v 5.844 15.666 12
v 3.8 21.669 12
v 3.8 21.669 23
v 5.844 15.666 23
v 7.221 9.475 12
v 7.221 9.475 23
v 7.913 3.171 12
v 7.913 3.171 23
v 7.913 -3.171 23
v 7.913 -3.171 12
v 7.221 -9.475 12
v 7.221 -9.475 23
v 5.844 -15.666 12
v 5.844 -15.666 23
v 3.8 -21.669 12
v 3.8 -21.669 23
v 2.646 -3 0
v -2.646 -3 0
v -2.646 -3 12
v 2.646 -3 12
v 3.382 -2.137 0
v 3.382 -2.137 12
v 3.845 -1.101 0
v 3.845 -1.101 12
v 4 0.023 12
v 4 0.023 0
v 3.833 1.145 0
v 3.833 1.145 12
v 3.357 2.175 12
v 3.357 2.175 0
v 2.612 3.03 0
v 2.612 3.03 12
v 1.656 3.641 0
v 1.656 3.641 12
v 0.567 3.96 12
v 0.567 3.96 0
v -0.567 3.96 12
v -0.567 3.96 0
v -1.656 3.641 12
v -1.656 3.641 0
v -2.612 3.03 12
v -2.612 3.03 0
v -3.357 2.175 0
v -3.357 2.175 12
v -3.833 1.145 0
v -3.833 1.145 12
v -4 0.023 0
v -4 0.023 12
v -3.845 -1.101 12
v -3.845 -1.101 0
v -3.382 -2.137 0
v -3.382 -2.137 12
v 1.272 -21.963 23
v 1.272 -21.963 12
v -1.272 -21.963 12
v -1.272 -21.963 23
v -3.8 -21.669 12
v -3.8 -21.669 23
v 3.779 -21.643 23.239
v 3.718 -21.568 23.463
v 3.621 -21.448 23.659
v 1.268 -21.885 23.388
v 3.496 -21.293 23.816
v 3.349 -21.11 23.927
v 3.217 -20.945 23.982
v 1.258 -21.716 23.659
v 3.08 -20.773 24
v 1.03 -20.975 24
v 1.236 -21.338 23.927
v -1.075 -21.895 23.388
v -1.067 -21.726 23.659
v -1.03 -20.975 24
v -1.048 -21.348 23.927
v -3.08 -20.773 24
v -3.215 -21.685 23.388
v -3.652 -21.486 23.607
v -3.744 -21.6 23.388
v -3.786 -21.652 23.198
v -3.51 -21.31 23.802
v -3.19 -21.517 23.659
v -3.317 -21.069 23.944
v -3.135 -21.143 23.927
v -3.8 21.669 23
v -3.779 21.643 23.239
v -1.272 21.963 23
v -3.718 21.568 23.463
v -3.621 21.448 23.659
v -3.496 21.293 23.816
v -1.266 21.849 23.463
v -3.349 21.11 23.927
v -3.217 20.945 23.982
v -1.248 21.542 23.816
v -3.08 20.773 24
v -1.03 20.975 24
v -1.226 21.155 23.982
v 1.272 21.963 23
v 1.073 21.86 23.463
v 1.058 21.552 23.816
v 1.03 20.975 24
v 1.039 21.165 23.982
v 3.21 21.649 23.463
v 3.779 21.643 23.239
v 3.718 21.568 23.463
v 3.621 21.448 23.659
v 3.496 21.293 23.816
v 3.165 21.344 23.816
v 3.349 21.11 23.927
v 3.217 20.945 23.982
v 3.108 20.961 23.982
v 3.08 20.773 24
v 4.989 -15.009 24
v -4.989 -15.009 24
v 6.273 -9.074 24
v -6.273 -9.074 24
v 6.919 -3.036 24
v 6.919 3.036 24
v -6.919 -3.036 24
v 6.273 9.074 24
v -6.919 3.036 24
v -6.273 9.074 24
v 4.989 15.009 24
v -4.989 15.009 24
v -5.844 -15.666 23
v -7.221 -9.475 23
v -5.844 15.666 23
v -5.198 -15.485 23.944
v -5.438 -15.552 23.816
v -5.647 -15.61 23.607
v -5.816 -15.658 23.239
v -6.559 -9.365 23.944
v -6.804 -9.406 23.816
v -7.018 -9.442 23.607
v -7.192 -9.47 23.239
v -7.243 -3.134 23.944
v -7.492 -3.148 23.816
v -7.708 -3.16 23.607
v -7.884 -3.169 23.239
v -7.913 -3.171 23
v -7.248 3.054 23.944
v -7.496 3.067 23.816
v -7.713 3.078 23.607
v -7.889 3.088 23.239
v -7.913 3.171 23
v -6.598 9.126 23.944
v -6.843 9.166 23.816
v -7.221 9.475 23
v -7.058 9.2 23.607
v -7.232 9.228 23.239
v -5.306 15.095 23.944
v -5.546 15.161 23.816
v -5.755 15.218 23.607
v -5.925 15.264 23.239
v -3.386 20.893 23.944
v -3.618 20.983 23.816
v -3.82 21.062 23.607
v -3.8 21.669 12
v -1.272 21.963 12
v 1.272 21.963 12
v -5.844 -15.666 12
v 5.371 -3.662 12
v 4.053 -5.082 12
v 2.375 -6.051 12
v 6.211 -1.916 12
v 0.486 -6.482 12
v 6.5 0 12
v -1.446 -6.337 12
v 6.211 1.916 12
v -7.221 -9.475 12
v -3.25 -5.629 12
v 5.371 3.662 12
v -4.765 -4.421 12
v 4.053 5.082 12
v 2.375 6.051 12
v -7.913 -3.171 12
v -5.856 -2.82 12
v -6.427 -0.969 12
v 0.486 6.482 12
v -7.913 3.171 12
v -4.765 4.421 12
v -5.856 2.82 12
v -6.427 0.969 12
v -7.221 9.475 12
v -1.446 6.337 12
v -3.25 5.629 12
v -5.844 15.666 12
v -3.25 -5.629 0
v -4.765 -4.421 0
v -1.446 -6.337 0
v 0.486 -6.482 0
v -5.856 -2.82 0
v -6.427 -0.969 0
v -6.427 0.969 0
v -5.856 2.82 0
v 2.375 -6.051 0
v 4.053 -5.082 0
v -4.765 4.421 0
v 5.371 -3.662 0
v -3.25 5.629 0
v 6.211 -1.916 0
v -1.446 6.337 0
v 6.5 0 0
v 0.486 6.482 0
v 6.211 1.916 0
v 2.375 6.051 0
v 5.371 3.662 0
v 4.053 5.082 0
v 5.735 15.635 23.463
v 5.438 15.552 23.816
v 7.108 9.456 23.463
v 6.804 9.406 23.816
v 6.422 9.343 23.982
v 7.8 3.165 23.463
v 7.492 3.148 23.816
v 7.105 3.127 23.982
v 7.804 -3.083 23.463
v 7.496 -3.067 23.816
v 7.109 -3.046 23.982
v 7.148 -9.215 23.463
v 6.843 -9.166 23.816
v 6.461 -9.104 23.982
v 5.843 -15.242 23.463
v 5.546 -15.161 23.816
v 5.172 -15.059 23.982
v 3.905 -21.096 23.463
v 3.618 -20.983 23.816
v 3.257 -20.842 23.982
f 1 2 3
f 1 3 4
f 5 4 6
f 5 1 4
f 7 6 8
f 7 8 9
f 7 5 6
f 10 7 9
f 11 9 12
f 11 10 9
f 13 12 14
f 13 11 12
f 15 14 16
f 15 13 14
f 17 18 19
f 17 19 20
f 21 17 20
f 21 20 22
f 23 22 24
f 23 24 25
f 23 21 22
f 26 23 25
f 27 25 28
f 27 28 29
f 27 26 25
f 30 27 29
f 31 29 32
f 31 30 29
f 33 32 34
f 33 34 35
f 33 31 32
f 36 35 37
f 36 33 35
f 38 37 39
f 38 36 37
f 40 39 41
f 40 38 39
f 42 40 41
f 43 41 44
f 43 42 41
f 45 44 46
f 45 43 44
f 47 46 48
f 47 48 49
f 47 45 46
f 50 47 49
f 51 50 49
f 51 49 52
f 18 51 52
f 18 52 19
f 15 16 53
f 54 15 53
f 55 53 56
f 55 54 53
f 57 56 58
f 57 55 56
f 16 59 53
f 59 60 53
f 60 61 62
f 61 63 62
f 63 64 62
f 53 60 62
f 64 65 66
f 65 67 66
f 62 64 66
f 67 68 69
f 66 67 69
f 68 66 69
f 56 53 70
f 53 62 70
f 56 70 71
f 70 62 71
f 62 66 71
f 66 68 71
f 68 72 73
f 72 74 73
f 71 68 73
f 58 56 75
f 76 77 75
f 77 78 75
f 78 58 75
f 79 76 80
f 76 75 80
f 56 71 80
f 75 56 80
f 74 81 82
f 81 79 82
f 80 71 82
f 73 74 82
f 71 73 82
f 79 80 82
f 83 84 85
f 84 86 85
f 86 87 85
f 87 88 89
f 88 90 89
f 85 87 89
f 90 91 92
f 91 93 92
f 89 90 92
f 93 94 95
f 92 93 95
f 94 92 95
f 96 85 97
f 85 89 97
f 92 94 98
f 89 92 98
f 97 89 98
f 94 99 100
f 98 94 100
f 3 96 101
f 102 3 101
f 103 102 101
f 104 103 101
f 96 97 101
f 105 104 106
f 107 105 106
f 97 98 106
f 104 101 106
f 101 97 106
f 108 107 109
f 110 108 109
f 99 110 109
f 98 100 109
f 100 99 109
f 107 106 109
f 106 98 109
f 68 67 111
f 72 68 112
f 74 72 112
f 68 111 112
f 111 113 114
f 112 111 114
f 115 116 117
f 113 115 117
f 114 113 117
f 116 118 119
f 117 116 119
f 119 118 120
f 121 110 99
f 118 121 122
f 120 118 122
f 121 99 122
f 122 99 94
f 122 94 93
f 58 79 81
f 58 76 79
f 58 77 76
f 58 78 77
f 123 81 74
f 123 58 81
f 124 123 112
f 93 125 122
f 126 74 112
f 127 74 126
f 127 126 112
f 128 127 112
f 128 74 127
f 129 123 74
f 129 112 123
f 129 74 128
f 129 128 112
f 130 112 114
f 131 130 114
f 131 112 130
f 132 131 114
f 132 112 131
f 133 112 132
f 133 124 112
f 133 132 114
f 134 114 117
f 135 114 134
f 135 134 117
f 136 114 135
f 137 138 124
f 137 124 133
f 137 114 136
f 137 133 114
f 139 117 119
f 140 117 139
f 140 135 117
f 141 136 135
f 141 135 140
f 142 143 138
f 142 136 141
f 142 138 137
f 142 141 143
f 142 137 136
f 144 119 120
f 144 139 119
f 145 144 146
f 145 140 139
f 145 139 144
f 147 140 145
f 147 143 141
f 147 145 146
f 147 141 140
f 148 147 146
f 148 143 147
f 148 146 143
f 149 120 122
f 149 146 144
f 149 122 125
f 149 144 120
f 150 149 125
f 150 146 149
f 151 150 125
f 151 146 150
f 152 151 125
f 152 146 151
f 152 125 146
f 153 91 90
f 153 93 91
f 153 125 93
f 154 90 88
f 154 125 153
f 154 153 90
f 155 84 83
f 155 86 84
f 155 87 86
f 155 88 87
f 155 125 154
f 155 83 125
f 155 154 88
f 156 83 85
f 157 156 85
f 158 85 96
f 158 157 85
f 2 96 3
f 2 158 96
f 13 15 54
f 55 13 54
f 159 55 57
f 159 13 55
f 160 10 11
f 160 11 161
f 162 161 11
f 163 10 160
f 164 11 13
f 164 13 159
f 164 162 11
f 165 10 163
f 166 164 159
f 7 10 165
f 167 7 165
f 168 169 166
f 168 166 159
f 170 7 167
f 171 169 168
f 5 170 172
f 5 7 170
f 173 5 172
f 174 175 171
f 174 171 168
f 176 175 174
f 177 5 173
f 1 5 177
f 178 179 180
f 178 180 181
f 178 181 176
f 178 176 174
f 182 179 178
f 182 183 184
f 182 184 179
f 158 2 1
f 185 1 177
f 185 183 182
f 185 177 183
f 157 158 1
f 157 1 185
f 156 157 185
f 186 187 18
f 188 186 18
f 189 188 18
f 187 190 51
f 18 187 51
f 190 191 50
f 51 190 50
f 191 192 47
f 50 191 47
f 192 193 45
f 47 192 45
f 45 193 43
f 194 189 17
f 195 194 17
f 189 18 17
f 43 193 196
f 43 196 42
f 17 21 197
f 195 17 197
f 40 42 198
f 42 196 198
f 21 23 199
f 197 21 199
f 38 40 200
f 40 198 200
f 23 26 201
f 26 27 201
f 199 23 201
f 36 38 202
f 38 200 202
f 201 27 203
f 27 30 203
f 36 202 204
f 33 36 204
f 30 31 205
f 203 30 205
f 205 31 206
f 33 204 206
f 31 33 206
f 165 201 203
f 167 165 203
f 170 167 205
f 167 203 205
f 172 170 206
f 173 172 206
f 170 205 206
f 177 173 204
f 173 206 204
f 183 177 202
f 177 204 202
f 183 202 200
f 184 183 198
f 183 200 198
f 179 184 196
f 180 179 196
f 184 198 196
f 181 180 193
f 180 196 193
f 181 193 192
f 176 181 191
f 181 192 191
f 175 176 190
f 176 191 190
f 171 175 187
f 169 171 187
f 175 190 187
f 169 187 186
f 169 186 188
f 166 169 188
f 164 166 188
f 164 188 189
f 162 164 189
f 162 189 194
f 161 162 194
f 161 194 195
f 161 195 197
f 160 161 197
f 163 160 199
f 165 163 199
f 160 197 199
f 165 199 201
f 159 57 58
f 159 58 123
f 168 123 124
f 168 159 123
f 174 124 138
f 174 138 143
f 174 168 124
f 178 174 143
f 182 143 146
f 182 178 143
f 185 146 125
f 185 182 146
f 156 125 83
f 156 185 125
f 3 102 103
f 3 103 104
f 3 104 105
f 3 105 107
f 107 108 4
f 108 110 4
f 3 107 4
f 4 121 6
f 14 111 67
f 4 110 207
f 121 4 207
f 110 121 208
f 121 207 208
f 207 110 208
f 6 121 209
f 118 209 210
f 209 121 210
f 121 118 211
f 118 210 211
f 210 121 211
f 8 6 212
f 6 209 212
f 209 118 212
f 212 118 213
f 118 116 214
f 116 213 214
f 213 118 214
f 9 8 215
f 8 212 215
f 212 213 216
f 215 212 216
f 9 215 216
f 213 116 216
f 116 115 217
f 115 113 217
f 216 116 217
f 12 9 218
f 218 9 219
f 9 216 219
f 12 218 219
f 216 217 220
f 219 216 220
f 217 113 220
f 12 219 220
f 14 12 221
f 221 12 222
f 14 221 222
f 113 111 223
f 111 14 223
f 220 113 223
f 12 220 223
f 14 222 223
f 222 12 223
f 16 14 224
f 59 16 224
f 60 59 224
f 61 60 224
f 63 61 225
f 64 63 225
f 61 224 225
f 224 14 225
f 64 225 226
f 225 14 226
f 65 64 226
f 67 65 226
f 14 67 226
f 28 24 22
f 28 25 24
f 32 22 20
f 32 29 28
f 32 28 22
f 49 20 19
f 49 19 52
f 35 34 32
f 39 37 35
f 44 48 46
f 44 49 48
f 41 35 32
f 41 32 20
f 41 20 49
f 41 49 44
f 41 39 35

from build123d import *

# Parameters (mm, degrees)
SKETCH1_R           = 6.5
BOSS_EXTRUDE1_DEPTH = 12
BOSS_EXTRUDE2_DEPTH = 12
FILLET1_R           = 1


with BuildPart() as part:
    # Sketch1 → Boss-Extrude1 (new body)
    with BuildSketch(Plane.XY):
        Circle(SKETCH1_R)
        with BuildLine():
            Line((-2.645751311, -3), (2.645751311, -3))
            ThreePointArc((2.645751311, -3), (0, 4), (-2.645751311, -3))
        make_face(mode=Mode.SUBTRACT)
    extrude(amount=BOSS_EXTRUDE1_DEPTH)

    # Sketch2 → Boss-Extrude2 (add)
    with BuildSketch(Plane.XY.offset(12)):
        with BuildLine():
            ThreePointArc((3.8, 21.669333169), (8, 0), (3.8, -21.669333169))
            ThreePointArc((3.8, -21.669333169), (0, -22), (-3.8, -21.669333169))
            ThreePointArc((-3.8, -21.669333169), (-8, 0), (-3.8, 21.669333169))
            ThreePointArc((-3.8, 21.669333169), (0, 22), (3.8, 21.669333169))
        make_face()
    extrude(amount=BOSS_EXTRUDE2_DEPTH)

    # Fillet1
    fillet1_edges = [part.edges().sort_by_distance(p)[0] for p in [
        (0, 22, 24),
        (-8, 0, 24),
        (0, -22, 24),
        (8, 0, 24),
    ]]
    fillet(fillet1_edges, radius=FILLET1_R)


solid = part.part
